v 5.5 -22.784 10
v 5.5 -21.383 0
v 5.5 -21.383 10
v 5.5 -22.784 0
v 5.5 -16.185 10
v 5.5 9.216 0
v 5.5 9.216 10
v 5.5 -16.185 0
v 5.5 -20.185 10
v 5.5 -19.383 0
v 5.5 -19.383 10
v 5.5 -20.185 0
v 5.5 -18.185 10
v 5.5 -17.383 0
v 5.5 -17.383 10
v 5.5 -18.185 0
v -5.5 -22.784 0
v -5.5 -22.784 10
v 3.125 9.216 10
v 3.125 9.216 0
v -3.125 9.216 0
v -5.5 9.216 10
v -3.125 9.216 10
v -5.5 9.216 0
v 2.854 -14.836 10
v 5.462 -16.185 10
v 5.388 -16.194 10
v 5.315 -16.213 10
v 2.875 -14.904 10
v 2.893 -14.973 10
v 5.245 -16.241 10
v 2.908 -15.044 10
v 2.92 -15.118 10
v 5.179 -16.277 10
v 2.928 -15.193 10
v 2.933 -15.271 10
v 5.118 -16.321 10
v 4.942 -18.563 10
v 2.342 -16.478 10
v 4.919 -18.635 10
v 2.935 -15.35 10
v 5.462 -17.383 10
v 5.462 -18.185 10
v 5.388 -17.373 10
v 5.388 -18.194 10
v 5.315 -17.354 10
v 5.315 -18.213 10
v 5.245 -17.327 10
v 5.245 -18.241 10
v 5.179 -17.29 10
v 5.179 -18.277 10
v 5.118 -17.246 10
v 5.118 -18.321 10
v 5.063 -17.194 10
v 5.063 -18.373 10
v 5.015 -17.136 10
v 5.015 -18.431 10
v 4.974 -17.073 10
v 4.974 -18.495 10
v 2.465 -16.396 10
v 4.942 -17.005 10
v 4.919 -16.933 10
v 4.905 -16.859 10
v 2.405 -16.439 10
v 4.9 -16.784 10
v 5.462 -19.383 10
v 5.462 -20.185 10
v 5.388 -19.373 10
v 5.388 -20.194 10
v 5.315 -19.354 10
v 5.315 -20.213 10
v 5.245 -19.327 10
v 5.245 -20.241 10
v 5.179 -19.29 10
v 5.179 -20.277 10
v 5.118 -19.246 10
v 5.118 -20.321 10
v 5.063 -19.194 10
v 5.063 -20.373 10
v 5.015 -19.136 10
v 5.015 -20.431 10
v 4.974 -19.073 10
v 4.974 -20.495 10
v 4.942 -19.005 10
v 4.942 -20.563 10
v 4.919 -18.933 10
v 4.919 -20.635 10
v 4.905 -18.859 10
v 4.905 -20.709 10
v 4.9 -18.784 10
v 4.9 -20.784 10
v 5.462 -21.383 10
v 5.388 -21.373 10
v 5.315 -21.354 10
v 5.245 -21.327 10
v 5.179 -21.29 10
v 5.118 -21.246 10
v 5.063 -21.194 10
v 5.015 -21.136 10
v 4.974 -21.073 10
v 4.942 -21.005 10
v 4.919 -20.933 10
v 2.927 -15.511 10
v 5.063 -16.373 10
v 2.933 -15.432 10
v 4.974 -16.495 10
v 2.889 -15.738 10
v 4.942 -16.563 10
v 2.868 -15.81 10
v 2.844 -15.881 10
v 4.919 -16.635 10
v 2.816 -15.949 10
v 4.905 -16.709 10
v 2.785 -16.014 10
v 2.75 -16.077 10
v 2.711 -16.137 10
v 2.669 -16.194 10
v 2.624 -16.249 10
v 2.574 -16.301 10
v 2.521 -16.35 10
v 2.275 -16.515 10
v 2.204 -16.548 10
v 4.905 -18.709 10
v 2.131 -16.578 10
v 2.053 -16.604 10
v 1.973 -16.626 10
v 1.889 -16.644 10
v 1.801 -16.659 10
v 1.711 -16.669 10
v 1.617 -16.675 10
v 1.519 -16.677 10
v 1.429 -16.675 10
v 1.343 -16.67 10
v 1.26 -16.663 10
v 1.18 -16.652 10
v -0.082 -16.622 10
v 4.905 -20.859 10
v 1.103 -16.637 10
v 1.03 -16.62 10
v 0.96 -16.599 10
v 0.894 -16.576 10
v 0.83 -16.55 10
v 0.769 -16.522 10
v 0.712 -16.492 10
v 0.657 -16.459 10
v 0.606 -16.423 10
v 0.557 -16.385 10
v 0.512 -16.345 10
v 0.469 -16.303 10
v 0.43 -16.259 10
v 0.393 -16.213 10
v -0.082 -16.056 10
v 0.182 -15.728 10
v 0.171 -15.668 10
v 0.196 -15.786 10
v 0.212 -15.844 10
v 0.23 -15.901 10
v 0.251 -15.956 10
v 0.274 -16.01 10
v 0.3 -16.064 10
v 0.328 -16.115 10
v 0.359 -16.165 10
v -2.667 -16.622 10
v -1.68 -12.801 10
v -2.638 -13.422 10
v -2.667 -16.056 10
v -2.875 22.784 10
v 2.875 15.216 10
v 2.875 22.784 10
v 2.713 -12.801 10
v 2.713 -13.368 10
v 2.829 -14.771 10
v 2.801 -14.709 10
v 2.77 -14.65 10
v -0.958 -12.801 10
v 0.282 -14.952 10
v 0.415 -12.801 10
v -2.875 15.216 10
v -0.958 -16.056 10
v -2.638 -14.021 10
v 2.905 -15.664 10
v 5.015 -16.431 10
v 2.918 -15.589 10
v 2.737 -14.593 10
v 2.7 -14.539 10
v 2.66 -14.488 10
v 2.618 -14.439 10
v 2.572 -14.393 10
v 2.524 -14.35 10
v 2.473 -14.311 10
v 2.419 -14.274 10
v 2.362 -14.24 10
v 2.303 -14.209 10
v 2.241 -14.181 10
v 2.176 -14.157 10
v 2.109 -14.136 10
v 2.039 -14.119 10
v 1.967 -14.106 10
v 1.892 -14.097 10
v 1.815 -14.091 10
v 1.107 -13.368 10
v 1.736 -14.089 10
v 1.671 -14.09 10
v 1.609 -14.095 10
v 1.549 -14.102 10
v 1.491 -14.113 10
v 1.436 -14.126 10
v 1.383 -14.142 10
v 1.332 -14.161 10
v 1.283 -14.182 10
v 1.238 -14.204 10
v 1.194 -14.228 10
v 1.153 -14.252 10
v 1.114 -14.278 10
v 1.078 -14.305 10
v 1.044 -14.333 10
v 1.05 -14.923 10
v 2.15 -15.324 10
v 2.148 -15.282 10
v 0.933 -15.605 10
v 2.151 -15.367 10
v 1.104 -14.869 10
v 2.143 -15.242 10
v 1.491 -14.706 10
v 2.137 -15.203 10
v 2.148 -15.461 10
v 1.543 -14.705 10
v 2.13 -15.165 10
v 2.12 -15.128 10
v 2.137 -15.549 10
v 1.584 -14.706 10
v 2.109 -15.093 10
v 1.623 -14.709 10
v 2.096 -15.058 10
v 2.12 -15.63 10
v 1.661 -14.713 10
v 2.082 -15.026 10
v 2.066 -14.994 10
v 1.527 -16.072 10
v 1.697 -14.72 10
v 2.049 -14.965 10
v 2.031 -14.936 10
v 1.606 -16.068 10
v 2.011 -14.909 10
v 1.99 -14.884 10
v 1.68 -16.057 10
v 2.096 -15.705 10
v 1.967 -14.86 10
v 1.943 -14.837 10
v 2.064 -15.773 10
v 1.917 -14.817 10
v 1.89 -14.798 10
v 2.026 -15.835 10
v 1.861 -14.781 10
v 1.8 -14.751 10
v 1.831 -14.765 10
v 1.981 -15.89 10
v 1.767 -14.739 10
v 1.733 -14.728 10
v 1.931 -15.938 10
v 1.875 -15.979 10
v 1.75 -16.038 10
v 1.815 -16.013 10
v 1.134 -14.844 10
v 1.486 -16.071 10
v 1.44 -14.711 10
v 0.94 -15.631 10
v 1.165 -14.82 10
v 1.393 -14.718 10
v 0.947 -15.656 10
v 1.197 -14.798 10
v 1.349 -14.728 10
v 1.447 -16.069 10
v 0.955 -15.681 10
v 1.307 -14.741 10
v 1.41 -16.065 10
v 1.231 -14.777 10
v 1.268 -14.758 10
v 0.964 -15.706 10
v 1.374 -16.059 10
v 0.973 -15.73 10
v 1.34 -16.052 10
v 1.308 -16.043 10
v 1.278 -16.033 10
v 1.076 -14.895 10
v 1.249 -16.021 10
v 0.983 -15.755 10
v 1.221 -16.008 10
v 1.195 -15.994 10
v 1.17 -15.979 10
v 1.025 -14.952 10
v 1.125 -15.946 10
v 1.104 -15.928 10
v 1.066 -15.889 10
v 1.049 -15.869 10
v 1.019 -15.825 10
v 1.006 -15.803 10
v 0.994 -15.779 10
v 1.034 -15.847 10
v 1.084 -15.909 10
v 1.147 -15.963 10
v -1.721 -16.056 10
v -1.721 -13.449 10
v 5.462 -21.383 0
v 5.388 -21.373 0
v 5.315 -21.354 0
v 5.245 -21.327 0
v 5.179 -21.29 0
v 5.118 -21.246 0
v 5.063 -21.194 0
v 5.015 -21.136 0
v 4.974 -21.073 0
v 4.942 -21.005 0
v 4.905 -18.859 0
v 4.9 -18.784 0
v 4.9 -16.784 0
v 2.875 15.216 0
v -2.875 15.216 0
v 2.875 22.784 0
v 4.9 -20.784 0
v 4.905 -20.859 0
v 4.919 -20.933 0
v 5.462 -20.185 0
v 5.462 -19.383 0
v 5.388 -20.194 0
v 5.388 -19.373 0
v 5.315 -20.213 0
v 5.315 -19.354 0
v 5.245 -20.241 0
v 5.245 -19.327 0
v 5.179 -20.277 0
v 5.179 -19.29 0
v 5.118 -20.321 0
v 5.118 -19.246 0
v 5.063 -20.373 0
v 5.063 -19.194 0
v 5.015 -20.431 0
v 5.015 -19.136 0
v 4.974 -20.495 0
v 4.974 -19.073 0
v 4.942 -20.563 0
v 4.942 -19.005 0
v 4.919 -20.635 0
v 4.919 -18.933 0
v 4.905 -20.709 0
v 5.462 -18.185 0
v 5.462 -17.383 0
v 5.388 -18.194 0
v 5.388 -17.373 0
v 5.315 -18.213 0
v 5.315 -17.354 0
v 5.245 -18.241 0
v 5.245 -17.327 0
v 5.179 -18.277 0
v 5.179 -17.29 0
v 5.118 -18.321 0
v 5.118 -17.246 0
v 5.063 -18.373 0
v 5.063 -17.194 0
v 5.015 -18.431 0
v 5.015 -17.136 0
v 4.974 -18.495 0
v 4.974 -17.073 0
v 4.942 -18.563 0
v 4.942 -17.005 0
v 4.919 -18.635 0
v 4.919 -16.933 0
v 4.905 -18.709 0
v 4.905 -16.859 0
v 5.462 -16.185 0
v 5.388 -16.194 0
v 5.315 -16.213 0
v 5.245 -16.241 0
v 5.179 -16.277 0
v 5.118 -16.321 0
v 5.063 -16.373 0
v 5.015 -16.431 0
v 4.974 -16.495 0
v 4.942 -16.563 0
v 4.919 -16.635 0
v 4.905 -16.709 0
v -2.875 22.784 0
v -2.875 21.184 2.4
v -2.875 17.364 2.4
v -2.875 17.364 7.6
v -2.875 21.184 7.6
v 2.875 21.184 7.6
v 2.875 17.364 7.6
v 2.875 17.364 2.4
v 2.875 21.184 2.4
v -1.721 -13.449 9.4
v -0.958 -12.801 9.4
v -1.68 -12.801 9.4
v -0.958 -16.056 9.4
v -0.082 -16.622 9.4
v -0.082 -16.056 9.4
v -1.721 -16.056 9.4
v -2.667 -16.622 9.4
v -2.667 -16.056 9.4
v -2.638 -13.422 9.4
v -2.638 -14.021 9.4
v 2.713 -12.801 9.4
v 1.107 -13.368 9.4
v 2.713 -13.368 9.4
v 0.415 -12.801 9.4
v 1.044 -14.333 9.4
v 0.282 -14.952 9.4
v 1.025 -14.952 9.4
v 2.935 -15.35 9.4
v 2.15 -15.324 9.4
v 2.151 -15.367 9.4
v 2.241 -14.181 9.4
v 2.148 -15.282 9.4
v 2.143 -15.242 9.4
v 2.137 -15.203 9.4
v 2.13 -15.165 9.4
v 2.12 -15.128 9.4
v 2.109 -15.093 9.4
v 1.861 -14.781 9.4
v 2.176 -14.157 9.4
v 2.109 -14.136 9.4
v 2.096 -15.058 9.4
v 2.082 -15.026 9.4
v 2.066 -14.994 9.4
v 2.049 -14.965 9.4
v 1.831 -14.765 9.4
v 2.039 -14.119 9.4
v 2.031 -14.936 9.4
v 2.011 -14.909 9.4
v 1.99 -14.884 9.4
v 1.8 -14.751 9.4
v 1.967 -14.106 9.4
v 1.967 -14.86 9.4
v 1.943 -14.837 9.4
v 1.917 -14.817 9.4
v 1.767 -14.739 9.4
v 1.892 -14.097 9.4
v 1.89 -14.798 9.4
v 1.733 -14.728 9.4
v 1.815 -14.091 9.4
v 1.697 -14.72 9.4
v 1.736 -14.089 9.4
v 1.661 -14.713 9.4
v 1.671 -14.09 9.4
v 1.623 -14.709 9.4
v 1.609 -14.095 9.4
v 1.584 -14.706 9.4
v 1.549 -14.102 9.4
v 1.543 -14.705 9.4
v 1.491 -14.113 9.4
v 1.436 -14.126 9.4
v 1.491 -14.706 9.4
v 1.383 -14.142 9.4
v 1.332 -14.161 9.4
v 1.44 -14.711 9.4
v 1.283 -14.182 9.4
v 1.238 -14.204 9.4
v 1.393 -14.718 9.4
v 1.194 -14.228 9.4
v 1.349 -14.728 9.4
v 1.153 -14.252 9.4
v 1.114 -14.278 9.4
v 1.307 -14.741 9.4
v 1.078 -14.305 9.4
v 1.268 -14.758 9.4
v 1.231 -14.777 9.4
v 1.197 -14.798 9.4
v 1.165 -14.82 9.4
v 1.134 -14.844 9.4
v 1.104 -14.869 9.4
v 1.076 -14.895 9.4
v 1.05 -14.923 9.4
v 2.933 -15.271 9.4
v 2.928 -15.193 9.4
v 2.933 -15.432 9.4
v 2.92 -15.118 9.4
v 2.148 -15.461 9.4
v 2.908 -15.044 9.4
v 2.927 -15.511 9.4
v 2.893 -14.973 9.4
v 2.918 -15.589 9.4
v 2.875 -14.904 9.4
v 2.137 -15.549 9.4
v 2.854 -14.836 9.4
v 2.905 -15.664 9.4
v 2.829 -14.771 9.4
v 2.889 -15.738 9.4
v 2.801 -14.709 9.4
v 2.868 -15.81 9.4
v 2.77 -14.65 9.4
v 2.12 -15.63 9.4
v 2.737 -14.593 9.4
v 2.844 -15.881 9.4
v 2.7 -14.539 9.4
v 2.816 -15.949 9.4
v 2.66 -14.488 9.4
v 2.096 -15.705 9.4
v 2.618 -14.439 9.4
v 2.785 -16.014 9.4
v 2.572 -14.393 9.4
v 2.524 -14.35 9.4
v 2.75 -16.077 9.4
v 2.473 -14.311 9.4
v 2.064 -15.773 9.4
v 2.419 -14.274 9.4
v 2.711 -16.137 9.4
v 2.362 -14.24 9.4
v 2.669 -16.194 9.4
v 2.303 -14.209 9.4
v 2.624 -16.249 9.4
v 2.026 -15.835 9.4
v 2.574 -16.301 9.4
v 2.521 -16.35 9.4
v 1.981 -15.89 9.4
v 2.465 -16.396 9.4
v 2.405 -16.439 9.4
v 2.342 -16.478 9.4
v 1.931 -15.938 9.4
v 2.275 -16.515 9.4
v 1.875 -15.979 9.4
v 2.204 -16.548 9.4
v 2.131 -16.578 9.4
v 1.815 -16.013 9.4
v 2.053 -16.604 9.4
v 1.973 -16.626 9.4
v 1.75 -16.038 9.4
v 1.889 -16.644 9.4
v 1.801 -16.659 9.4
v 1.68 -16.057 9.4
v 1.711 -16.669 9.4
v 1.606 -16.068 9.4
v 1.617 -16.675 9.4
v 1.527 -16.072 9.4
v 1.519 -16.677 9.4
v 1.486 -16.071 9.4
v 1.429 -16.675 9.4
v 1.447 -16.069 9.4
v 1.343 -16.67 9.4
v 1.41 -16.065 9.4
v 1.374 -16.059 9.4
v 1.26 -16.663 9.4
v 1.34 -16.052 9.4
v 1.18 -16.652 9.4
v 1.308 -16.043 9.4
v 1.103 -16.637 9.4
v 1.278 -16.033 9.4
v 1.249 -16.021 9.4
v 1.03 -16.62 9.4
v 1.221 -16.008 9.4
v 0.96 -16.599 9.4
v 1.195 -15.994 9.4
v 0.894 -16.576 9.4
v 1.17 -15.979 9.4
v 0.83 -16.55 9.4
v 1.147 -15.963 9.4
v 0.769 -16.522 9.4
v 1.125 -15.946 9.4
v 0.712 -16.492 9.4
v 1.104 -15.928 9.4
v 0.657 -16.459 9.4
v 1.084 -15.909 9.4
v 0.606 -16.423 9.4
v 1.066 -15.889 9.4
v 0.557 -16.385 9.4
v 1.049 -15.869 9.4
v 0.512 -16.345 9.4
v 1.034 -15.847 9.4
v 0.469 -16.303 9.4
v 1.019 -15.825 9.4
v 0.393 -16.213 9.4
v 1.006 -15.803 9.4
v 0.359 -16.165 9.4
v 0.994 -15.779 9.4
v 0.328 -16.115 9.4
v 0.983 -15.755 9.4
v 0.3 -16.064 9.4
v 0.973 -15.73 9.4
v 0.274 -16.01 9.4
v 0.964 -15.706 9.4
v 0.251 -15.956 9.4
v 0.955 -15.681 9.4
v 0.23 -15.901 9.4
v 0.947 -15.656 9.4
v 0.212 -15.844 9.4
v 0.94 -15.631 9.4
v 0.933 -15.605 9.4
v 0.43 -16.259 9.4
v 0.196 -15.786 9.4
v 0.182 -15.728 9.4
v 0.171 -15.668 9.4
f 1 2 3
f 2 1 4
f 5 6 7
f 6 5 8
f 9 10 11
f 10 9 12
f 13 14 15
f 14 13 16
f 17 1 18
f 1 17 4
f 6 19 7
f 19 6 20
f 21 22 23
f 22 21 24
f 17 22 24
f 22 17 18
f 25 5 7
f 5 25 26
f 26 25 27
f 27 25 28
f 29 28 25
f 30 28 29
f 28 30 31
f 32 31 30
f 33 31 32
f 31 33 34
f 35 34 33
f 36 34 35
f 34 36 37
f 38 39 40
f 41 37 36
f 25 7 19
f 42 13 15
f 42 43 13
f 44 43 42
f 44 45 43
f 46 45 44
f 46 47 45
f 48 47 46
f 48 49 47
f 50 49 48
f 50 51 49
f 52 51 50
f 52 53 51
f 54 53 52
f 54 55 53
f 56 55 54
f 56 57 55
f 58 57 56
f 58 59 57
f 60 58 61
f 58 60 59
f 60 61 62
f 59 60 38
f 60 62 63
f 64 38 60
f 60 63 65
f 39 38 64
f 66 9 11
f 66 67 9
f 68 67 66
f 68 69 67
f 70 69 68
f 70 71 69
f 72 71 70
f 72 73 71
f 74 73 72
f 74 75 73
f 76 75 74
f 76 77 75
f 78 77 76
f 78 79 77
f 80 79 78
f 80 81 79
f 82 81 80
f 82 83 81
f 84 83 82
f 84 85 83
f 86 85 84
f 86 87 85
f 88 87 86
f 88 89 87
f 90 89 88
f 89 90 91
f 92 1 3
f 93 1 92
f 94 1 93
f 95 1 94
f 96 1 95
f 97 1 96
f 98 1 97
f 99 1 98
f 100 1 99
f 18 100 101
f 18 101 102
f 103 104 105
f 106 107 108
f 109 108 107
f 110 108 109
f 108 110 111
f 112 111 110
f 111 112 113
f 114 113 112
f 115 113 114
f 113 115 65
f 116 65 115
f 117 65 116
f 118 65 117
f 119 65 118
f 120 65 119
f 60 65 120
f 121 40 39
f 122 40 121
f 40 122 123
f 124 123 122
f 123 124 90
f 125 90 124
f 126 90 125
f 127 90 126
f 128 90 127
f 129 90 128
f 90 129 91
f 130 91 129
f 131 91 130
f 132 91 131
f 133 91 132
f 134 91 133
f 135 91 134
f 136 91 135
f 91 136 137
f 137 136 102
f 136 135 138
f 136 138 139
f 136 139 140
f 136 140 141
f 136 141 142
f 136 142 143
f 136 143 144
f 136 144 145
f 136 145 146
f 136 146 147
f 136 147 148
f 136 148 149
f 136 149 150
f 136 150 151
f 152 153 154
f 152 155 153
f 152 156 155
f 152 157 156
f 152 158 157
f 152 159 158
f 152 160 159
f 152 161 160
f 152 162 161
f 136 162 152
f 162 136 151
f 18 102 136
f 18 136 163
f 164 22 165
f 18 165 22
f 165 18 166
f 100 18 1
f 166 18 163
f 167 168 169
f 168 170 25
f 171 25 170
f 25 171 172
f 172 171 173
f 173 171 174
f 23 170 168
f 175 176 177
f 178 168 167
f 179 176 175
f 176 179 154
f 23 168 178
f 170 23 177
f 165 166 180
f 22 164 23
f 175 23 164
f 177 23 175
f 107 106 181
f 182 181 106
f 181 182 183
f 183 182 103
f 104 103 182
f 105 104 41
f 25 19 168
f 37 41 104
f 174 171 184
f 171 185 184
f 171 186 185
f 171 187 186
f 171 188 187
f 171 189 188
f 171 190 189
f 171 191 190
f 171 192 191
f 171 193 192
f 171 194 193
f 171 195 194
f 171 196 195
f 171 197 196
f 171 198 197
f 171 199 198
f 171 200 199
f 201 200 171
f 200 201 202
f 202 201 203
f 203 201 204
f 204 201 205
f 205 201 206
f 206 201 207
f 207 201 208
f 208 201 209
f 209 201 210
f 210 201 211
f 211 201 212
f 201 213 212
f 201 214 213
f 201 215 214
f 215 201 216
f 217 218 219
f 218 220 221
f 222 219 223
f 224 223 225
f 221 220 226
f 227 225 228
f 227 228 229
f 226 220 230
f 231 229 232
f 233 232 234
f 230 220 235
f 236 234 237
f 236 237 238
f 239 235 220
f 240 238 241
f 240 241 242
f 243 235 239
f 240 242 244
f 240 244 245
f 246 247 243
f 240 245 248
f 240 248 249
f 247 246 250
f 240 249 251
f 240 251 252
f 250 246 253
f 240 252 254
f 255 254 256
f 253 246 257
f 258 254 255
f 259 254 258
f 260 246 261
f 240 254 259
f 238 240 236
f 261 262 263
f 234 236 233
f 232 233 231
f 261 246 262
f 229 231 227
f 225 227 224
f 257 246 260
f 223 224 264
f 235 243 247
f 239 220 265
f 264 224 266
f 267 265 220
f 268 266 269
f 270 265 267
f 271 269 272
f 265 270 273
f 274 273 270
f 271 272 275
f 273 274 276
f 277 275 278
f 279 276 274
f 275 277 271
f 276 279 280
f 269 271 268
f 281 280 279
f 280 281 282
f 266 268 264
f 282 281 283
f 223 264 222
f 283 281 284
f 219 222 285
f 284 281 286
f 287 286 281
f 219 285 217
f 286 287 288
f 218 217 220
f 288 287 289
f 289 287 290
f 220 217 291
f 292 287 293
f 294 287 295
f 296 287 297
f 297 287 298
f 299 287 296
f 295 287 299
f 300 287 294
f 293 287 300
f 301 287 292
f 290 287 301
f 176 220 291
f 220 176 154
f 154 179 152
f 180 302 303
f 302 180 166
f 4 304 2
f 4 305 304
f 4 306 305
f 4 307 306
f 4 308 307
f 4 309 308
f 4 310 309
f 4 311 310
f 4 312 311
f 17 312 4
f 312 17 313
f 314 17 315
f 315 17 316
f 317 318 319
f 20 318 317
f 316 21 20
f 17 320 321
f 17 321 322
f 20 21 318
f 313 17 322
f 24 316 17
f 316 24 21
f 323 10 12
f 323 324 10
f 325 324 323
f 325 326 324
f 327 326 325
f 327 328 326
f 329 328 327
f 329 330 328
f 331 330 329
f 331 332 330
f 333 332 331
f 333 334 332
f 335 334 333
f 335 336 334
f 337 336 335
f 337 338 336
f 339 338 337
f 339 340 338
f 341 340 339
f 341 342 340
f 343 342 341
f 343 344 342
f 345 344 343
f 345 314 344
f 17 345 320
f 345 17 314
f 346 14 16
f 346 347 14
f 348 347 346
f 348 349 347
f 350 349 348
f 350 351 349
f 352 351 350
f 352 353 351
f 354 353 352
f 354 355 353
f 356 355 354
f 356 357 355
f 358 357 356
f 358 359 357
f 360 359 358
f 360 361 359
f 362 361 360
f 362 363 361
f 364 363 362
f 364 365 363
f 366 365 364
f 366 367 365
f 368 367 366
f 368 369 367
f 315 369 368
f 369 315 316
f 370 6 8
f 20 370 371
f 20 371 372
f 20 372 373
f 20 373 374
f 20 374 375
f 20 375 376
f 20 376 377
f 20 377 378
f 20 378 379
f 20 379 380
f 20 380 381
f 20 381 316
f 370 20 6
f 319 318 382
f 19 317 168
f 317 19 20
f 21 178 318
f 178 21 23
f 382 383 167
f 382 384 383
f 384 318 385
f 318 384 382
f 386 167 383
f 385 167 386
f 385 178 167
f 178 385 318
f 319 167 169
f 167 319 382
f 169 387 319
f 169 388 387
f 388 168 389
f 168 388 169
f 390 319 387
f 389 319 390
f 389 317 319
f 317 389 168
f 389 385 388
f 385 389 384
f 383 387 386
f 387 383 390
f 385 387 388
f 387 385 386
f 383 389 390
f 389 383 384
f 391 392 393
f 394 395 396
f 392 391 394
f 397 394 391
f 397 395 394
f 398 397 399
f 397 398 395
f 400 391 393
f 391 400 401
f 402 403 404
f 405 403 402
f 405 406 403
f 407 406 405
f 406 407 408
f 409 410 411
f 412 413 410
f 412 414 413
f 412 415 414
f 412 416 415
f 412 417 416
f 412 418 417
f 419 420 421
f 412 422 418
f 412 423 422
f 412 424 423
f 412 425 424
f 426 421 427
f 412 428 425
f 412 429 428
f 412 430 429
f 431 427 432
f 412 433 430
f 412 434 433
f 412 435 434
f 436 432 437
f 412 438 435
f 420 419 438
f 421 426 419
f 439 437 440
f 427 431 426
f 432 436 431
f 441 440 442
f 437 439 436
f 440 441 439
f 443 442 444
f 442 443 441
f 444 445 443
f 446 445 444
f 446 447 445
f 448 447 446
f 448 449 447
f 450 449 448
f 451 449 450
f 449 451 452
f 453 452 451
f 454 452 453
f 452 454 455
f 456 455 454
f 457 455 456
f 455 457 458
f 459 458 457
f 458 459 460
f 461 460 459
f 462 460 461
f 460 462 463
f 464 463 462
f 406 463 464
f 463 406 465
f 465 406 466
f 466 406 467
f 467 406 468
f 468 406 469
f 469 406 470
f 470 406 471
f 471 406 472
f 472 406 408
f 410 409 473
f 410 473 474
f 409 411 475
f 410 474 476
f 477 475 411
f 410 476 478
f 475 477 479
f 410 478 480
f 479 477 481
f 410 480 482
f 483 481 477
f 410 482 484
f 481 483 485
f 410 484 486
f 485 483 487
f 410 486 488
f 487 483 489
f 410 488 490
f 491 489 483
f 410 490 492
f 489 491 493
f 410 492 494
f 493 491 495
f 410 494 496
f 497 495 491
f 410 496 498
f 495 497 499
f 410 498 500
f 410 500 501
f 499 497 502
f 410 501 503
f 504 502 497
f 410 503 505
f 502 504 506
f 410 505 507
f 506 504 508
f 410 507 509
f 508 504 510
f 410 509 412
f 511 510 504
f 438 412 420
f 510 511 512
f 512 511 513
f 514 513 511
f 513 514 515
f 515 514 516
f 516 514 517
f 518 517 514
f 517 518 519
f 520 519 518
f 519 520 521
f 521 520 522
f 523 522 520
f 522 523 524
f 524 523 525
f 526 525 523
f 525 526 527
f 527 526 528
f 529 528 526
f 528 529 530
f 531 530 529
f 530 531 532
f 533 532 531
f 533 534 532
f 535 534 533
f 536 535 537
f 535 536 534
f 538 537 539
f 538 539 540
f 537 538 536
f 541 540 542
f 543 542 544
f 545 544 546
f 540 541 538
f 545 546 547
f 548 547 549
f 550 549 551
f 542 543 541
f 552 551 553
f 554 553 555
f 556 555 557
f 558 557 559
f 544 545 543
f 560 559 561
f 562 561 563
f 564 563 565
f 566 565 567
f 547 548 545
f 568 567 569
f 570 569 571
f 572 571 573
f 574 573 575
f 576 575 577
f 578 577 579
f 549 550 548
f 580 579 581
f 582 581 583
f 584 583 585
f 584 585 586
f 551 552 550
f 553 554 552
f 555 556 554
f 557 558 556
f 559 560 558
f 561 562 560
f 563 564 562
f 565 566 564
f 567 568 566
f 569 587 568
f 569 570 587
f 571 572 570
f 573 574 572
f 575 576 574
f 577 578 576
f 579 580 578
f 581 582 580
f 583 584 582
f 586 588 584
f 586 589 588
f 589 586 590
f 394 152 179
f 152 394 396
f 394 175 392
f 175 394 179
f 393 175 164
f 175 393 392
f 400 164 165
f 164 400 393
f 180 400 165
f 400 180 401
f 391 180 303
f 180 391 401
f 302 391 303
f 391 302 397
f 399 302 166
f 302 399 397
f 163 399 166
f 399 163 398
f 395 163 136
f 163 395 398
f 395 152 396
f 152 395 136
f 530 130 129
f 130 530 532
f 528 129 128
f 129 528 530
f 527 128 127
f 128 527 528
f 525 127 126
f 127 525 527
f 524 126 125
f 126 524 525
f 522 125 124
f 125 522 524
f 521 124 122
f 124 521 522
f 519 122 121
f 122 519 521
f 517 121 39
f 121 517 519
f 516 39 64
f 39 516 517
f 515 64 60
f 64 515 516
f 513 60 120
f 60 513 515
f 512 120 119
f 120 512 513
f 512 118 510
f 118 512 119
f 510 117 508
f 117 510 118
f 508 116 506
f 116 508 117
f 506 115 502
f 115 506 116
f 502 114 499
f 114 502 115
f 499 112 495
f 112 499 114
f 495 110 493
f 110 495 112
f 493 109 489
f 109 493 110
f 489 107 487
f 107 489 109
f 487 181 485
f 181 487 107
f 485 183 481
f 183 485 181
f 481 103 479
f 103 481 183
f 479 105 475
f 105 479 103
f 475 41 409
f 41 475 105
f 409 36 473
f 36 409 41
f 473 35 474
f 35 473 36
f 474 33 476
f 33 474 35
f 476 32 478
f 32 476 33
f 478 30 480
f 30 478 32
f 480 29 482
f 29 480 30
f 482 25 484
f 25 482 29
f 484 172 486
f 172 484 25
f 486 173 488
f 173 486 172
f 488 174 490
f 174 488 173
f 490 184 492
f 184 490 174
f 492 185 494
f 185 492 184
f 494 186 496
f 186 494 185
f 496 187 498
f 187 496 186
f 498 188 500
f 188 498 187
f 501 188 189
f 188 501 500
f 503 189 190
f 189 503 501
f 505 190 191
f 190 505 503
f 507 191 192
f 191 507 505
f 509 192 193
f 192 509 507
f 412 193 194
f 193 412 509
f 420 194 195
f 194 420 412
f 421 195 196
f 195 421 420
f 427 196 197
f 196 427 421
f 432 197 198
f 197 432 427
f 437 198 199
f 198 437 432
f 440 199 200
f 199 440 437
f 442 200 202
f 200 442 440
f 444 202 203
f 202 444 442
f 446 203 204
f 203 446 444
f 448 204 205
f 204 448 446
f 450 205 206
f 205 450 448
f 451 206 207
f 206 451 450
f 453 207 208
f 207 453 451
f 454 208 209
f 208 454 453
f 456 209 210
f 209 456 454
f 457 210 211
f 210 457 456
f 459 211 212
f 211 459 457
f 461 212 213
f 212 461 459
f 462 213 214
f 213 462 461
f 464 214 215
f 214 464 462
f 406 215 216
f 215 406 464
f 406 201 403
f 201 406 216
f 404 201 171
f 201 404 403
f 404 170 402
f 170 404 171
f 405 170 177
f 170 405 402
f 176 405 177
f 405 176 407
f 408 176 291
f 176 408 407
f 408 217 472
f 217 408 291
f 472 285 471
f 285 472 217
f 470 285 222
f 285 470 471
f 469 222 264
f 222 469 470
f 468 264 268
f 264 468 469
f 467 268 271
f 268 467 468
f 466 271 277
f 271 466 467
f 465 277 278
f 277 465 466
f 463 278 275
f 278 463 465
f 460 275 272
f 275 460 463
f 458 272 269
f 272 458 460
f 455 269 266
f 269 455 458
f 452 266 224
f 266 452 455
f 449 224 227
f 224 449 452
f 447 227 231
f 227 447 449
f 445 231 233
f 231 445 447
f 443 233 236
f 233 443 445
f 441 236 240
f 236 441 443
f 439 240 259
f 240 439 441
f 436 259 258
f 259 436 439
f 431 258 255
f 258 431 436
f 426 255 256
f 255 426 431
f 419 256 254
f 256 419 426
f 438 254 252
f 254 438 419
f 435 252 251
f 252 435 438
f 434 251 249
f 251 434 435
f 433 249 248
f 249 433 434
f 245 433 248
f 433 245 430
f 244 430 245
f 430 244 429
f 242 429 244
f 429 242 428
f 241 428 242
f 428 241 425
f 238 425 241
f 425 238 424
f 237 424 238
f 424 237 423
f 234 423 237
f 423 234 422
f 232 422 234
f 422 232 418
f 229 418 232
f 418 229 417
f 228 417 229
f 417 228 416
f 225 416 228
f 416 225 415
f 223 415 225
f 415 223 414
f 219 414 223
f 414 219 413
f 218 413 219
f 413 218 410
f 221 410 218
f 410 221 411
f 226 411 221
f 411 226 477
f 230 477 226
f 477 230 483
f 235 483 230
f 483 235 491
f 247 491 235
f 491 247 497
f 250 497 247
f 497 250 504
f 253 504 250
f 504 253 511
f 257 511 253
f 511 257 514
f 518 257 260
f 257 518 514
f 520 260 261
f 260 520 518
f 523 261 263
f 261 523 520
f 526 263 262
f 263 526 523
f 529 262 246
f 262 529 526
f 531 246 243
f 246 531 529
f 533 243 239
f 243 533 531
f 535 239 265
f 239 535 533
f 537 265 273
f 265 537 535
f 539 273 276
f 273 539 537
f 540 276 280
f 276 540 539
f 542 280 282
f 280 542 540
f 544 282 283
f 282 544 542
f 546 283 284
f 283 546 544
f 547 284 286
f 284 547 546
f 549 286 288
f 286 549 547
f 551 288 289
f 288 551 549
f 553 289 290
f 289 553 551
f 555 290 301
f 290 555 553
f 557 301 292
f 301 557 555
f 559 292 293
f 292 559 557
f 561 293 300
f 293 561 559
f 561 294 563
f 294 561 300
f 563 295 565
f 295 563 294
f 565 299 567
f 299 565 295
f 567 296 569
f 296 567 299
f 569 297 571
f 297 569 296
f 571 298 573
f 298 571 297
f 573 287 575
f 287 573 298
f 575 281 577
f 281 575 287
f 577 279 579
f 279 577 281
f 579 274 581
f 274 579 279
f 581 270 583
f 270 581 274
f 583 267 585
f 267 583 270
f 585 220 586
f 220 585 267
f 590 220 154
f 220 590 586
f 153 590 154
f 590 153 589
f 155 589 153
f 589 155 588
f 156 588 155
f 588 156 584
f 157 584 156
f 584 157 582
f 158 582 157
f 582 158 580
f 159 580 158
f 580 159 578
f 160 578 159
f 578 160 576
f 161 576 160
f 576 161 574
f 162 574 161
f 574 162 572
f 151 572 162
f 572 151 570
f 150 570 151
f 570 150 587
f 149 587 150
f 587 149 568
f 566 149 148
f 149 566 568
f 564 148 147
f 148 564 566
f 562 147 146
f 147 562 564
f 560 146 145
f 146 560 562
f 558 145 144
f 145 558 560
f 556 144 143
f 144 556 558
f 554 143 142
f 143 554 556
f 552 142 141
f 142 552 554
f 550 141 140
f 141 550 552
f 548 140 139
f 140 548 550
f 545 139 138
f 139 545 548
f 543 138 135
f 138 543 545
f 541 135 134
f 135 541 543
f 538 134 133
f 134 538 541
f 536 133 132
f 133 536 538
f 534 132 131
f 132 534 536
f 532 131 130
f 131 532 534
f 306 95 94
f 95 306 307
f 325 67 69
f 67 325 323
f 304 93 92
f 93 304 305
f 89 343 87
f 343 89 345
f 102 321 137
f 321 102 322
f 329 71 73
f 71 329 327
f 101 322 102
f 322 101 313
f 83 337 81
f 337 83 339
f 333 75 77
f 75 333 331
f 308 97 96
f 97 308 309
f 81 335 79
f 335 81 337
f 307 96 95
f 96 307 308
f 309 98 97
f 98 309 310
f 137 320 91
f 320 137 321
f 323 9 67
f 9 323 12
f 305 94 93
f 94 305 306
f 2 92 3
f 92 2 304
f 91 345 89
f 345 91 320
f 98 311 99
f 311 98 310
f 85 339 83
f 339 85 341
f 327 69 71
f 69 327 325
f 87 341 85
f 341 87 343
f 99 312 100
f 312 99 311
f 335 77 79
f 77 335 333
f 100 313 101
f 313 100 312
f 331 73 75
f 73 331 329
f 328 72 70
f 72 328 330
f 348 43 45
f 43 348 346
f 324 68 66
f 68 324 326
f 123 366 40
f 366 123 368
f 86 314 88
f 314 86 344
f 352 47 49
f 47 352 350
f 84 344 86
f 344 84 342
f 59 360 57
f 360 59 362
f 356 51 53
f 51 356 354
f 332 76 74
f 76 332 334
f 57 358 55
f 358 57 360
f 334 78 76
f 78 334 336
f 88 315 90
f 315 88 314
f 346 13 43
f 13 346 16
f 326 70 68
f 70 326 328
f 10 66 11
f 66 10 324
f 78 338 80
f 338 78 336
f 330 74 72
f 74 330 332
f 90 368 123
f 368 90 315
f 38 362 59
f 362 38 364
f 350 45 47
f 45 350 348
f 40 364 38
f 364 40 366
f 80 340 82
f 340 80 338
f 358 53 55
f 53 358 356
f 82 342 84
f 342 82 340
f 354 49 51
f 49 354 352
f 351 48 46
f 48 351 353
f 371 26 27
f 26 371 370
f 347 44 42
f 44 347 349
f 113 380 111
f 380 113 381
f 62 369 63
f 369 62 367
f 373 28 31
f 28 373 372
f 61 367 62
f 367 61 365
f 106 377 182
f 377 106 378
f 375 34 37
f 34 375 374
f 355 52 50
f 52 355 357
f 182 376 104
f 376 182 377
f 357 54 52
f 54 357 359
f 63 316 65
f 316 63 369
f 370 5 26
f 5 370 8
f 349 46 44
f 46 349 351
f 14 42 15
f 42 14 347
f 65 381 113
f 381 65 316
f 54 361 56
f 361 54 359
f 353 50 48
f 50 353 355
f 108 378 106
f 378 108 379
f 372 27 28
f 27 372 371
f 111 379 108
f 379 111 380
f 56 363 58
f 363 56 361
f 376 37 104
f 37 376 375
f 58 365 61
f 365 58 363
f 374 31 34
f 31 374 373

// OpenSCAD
$fn = 50;

difference() {
	union() {
		translate(v = [0, 9.21625, 0]) {
			rotate(a = [90, 0, 0]) {
				difference() {
					union() {
						translate(v = [-5.5, 0, 0]) {
							cube(size = [11.0, 10.0, 32.0]);
						}
						translate(v = [0, 10.0, 0]) {
							rotate(a = [90, 0, 0]) {
								linear_extrude(height = 10.0) {
									polygon(points = [[-2.875, -13.5675], [2.875, -13.5675], [2.875, -6.0], [3.125, 0], [3.125, 0.1], [-3.125, 0.1], [-3.125, 0], [-2.875, -6.0]]);
								}
							}
						}
					}
					union() {
						translate(v = [-2.975, 2.4000000000000004, -11.9675]) {
							cube(size = [5.95, 5.199999999999999, 3.8200000000000003]);
						}
						translate(v = [0, 9.4, 24.0]) {
							rotate(a = [-90, 0, 0]) {
								linear_extrude(height = 0.7) {
									text(font = "Arial:style=Bold", halign = "center", size = 4.0, text = "15", valign = "center");
								}
							}
						}
						translate(v = [5.5, 10.1, 30.0]) {
							rotate(a = [90, 0, 0]) {
								cylinder(h = 10.2, r = 0.6);
							}
						}
						translate(v = [5.5, 10.1, 28.0]) {
							rotate(a = [90, 0, 0]) {
								cylinder(h = 10.2, r = 0.6);
							}
						}
						translate(v = [5.5, 10.1, 26.0]) {
							rotate(a = [90, 0, 0]) {
								cylinder(h = 10.2, r = 0.6);
							}
						}
					}
				}
			}
		}
	}
	union();
}
